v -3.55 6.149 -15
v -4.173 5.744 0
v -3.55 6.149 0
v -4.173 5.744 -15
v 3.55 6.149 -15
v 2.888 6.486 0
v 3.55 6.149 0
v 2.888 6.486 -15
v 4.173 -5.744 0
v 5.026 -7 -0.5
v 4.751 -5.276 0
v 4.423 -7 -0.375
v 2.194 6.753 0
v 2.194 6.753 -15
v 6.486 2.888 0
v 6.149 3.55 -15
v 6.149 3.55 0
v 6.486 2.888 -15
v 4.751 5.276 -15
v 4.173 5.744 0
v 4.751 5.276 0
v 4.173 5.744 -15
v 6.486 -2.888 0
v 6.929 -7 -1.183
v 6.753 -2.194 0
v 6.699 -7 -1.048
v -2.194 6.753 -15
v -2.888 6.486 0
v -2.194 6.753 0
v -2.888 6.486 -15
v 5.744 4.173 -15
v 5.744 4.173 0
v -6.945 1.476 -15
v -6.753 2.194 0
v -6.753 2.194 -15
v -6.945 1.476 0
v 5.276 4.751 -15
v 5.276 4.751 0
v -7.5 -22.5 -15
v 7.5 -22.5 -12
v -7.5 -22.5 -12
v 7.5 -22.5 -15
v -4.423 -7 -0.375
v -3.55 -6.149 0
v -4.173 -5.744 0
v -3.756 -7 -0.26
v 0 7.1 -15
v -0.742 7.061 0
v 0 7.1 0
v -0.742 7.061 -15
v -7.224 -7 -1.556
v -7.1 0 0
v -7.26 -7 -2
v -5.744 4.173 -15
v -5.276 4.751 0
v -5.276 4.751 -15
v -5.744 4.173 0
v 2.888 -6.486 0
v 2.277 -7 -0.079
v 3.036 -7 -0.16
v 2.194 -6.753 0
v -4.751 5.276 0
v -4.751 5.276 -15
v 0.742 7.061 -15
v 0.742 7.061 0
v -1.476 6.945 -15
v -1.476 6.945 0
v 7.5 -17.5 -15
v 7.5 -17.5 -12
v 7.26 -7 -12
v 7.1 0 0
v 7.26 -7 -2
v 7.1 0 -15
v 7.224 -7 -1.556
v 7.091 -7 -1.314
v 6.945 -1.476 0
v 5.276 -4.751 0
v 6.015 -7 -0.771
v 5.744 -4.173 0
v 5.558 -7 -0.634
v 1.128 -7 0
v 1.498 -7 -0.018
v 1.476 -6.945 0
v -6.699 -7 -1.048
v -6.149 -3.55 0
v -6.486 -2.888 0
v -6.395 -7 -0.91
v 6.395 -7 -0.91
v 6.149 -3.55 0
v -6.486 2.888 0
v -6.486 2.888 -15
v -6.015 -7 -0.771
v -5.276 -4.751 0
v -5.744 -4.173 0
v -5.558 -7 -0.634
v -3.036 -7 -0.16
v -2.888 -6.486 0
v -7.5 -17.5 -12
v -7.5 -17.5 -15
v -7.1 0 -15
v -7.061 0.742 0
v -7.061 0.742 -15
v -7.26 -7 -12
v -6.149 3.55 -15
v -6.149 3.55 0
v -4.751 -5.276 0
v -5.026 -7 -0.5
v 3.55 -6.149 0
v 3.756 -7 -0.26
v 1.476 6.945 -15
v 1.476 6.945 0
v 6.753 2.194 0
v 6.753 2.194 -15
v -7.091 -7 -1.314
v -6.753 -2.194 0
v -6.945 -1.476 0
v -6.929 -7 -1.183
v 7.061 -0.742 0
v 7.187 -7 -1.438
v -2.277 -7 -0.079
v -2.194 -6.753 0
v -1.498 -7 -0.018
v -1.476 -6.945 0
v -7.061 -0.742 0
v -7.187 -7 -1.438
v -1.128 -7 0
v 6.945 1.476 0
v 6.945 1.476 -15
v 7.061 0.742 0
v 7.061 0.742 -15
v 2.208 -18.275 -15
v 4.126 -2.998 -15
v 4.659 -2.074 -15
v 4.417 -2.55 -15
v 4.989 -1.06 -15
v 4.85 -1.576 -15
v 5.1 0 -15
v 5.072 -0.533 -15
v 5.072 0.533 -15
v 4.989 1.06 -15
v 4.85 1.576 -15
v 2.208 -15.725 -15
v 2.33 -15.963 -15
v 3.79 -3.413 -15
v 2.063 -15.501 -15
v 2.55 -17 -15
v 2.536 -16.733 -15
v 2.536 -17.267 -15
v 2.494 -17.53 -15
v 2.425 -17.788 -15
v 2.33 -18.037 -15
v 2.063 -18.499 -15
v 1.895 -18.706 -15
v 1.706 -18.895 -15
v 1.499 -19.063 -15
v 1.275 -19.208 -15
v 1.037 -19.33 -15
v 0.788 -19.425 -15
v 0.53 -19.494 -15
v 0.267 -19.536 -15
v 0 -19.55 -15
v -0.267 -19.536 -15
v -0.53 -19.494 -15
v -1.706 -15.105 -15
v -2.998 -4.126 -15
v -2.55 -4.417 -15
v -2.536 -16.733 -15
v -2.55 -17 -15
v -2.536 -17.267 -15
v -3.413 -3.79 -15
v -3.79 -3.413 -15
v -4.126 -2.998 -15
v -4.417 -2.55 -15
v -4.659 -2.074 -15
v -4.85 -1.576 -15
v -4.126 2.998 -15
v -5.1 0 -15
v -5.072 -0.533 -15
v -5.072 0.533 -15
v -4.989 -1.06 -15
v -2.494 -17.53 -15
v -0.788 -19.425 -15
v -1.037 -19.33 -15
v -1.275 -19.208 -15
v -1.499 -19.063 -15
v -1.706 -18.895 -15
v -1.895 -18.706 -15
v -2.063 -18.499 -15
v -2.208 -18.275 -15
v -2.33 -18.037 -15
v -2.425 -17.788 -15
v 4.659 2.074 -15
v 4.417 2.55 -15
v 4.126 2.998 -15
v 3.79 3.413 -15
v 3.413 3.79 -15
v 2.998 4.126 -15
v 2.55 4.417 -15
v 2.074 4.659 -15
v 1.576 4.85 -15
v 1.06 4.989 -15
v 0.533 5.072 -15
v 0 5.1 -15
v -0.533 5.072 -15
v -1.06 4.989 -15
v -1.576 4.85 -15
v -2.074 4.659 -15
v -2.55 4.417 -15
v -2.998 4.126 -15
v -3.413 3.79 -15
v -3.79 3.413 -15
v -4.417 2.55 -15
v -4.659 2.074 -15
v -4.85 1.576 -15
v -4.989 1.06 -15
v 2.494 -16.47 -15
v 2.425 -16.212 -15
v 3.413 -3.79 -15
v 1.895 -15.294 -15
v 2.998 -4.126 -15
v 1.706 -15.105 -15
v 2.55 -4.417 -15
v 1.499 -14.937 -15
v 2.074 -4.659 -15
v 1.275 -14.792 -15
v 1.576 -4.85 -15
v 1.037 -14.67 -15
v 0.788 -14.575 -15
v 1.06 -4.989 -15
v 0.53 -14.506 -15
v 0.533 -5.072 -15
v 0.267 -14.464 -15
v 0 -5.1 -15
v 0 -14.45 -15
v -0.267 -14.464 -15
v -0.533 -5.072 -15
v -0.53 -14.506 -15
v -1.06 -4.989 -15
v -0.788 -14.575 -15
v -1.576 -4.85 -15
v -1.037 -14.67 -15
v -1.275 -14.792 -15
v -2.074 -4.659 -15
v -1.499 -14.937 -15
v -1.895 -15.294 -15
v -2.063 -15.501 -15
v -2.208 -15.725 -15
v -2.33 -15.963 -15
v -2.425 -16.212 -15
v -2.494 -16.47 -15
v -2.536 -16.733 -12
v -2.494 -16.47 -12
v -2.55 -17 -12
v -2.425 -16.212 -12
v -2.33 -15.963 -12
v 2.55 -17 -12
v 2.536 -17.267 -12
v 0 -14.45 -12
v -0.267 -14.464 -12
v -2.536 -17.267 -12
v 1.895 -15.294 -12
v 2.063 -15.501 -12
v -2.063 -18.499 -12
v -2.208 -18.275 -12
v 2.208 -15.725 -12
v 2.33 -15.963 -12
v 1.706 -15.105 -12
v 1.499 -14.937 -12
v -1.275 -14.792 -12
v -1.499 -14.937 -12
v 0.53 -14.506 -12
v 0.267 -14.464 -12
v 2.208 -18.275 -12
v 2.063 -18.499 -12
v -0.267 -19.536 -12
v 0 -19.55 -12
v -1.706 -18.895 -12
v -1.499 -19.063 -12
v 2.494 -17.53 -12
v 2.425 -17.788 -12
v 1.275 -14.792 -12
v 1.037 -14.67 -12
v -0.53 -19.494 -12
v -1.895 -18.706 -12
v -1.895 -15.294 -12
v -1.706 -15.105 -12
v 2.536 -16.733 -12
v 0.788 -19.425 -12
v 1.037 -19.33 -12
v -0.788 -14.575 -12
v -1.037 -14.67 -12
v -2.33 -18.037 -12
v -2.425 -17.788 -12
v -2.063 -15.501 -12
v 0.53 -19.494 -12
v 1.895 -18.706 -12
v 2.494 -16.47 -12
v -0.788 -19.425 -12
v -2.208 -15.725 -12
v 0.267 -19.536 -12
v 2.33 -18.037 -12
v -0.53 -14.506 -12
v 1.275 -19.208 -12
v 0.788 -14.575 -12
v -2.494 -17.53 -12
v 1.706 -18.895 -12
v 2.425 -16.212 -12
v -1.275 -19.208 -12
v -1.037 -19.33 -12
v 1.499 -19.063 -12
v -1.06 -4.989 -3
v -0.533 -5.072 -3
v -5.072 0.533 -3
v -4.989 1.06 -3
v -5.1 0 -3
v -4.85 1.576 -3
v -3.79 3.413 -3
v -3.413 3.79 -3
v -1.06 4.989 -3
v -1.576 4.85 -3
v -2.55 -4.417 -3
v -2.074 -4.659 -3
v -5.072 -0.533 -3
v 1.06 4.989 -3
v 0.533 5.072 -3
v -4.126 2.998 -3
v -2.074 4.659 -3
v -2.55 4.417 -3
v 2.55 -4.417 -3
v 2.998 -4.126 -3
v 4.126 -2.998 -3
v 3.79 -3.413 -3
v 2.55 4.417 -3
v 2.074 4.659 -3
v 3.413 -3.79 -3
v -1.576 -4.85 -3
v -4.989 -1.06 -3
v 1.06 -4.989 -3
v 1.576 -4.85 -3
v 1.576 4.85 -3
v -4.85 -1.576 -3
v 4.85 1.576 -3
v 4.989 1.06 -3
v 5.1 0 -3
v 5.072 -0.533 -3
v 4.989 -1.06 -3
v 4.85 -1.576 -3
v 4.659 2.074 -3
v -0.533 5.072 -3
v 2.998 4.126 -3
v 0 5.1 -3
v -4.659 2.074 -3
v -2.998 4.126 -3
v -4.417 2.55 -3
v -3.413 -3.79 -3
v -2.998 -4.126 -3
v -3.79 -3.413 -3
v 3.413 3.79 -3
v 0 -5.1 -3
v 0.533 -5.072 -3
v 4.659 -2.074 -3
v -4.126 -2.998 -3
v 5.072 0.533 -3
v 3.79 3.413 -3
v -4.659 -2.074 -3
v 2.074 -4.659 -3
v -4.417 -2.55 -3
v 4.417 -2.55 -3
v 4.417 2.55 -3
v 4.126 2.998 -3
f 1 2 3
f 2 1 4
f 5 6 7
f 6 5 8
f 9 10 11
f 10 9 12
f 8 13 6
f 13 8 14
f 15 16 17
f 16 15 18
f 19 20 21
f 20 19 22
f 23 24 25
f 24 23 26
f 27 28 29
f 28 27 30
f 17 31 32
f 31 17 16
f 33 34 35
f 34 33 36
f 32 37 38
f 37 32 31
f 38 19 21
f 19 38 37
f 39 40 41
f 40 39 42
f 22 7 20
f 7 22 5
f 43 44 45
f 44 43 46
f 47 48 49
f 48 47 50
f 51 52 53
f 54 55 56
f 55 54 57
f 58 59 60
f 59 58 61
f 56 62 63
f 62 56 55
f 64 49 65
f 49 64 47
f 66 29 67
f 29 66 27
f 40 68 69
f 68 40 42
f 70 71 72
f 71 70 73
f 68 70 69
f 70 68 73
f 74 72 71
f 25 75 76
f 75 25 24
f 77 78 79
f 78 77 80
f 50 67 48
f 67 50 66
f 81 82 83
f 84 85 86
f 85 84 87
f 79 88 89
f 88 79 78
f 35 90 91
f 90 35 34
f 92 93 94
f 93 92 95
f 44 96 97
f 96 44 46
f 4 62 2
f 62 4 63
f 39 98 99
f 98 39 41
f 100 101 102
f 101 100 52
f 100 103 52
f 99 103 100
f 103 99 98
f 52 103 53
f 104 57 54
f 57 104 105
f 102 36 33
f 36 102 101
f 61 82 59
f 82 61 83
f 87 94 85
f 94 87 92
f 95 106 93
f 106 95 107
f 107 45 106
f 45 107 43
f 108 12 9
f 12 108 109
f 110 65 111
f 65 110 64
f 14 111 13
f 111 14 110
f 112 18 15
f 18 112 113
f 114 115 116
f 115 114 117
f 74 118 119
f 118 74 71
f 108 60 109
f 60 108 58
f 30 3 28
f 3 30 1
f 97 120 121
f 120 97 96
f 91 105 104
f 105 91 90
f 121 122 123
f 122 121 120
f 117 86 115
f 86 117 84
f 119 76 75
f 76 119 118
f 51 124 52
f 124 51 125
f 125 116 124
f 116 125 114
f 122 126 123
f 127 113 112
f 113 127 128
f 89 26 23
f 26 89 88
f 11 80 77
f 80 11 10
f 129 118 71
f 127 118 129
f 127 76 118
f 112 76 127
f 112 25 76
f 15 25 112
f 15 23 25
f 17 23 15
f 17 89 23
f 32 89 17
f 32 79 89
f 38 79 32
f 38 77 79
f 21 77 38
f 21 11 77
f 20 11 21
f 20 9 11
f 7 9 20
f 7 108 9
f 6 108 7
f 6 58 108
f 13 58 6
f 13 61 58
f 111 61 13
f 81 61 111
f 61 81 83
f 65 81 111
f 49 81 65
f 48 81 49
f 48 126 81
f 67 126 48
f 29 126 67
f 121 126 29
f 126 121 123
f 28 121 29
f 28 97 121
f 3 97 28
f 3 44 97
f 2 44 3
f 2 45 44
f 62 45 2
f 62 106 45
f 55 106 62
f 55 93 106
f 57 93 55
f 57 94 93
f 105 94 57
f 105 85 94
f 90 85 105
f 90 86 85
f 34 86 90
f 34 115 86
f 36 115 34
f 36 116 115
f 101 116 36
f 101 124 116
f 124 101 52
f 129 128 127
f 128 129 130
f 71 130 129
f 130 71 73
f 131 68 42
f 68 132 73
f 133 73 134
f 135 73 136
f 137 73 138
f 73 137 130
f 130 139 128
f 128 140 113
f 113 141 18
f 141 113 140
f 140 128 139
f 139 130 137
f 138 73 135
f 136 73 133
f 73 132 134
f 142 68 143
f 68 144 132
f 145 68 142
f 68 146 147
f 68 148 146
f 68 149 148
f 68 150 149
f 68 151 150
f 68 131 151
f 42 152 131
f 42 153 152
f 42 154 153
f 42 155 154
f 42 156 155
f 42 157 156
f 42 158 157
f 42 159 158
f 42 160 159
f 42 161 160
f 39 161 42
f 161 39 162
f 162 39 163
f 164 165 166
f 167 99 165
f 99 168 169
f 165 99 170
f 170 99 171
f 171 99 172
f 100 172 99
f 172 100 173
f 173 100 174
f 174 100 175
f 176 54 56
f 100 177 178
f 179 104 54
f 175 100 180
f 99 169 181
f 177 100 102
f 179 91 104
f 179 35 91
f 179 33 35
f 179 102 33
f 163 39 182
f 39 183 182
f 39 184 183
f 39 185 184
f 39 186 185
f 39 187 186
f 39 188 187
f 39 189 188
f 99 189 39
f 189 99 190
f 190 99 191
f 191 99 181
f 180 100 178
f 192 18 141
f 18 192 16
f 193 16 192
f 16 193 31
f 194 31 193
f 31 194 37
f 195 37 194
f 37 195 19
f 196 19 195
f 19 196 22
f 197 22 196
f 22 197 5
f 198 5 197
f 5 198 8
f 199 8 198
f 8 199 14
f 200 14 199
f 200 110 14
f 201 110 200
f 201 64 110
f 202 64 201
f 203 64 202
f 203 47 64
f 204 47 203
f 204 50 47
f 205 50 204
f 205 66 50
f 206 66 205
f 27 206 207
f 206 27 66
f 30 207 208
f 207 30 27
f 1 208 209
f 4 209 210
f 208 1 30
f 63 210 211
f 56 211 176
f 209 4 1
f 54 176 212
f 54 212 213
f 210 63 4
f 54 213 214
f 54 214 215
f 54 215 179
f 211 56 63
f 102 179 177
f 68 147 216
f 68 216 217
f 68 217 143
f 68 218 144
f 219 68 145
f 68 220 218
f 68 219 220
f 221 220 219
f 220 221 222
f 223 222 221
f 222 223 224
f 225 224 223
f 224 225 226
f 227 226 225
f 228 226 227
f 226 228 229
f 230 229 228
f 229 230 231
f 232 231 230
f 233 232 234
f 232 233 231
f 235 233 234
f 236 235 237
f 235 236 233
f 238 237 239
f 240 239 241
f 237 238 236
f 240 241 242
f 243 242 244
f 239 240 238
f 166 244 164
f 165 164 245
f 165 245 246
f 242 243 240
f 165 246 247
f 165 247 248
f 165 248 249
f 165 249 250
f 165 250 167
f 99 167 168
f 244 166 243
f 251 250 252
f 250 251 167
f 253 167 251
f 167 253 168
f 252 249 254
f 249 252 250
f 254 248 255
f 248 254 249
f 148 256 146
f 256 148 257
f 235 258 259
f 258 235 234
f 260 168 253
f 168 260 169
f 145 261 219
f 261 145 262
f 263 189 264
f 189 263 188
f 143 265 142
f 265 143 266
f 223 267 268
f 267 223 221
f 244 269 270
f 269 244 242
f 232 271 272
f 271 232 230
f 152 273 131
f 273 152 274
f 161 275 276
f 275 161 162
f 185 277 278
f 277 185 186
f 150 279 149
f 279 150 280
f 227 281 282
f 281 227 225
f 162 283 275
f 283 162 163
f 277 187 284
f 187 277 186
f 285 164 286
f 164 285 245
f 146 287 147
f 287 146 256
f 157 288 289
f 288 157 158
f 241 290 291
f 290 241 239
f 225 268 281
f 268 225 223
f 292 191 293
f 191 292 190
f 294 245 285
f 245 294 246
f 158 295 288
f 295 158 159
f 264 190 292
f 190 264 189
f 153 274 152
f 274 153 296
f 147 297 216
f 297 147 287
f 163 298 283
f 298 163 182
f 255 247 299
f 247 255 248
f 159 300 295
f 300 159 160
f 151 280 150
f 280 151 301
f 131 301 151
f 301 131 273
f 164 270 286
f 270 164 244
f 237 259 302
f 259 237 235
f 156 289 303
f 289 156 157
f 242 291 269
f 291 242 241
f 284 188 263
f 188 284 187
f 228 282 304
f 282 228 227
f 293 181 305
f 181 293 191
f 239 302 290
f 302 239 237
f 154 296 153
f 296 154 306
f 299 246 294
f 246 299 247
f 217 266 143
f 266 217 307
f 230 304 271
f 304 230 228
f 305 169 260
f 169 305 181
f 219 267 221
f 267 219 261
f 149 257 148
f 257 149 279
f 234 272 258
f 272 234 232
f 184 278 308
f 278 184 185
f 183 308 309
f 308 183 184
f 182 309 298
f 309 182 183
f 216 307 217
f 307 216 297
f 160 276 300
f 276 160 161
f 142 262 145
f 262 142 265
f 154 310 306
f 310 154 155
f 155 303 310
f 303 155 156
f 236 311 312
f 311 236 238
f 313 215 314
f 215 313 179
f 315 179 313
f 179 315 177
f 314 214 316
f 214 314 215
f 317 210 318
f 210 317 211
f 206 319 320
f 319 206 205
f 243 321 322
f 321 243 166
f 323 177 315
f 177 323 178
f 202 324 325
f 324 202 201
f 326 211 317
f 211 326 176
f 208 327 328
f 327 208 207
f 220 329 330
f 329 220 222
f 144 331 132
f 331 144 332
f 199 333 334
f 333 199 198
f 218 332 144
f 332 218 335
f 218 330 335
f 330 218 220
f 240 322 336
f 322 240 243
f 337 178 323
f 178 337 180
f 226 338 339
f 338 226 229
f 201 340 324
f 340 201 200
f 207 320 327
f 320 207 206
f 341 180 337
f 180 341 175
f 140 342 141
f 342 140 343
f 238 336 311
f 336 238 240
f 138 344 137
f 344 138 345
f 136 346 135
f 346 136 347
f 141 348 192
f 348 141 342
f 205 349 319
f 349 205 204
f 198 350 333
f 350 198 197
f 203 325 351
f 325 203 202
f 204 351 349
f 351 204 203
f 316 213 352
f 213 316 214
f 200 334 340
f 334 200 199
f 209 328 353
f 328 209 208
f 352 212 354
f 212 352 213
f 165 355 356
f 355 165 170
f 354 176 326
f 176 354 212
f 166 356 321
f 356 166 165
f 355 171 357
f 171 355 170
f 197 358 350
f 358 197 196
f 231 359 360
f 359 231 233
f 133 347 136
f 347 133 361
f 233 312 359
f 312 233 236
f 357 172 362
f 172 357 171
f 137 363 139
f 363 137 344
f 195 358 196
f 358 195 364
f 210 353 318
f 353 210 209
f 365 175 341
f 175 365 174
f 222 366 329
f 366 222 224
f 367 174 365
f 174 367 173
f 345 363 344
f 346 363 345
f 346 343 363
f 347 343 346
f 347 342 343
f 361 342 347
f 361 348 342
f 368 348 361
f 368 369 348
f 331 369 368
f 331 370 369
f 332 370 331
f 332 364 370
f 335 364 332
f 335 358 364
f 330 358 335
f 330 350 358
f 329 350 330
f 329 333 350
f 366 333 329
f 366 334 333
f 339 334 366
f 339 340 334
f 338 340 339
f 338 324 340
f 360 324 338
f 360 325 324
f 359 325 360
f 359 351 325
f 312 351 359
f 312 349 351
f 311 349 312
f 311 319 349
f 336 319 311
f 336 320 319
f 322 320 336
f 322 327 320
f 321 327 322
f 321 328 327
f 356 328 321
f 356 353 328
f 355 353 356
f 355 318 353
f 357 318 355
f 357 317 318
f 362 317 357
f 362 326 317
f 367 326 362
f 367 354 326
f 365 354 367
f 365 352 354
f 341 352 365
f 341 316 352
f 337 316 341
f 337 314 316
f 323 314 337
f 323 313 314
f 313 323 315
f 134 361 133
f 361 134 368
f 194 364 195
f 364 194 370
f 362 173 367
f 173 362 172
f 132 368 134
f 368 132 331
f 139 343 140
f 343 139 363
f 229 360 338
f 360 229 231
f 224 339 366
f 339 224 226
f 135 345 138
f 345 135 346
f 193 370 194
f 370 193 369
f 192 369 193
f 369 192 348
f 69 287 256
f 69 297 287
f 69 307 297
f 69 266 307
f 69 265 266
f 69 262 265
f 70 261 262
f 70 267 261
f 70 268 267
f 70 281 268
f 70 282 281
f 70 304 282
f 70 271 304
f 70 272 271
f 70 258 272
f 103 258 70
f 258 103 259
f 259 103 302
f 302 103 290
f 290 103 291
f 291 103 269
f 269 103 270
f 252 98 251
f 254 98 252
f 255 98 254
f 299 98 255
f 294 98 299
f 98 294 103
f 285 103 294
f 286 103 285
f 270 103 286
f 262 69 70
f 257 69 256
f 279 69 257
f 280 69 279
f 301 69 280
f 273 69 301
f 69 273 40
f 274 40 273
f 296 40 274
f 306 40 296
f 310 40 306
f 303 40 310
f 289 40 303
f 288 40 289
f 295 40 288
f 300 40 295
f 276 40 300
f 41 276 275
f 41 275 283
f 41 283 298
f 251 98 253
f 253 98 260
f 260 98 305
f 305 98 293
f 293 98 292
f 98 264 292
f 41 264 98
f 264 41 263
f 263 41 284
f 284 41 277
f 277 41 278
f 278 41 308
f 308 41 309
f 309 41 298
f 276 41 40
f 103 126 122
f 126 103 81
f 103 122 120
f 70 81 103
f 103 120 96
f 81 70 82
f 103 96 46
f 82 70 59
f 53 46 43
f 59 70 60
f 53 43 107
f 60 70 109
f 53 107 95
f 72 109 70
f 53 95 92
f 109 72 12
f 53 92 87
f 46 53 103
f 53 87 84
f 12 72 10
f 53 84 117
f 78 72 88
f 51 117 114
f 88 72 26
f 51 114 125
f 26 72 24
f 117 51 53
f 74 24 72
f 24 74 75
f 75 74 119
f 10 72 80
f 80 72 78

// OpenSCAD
// 2020 holder for Y

rotate([0,180,0])y_rod_holder(rod=10);

module y_rod_holder(rod=8) {
  difference() {
    union() {
      hull() {
        cylinder(r=(rod/2)+0.1+2, h = 15, $fn=60);
        translate([0,-20,10])rotate([90,0,0])cube([15,10,5],center=true);
      }
    }
    translate([0,-12-(rod/2),0])cylinder(r=5.1/2,h=15,$fn=60);
    translate([0,0,3])cylinder(r=(rod/2)+0.1, h = 15, $fn=60);
    translate([0,-12-(rod/2),2]) color("red") cube([20,20,20],center=true);
  }
}
